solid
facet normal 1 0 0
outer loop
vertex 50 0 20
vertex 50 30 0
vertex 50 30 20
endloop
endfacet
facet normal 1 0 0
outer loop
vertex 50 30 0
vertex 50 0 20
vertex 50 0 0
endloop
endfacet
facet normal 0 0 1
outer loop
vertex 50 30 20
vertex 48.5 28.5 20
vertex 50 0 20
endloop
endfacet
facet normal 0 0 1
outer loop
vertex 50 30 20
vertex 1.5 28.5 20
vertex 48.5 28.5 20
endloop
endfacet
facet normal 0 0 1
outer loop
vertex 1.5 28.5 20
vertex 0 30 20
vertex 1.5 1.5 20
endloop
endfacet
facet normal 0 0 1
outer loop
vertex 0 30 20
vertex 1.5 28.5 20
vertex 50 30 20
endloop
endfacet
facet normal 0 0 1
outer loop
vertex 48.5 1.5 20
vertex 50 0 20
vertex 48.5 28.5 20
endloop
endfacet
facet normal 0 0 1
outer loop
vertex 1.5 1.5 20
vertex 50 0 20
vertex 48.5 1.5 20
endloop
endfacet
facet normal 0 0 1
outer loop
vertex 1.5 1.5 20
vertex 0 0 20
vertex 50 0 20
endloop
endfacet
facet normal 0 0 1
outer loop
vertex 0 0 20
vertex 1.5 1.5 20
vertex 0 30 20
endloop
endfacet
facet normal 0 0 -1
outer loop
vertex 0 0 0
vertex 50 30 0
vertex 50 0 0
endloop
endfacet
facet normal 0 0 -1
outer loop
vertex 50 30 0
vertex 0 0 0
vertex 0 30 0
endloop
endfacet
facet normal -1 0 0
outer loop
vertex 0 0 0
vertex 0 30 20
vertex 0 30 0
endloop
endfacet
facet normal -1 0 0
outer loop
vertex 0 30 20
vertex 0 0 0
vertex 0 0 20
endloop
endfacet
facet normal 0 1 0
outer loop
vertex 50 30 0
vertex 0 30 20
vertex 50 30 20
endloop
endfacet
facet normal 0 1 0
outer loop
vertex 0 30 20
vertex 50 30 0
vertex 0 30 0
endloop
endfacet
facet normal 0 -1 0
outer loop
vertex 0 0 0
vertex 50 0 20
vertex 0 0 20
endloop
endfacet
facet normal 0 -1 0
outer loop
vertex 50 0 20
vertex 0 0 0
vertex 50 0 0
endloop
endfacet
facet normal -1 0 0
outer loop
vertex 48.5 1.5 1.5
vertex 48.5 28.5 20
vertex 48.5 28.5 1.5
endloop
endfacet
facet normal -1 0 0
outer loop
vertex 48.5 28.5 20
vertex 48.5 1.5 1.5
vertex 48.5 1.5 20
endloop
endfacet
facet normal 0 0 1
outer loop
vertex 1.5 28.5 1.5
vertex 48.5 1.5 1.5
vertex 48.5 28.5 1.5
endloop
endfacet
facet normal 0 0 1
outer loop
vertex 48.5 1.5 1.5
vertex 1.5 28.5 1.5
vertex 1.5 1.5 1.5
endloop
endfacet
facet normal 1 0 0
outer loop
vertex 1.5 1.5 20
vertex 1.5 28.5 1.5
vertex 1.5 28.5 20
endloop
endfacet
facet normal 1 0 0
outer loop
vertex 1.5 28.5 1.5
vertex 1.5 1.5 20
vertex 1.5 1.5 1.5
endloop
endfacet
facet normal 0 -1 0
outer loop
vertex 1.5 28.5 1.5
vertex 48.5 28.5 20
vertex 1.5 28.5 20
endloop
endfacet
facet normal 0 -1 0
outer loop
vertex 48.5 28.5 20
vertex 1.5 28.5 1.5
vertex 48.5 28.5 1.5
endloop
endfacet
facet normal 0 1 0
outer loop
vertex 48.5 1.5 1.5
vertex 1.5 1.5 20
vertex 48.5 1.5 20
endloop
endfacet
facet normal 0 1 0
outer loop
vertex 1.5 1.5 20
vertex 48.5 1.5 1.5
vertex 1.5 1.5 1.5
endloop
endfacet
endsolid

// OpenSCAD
$fn = 32;

// ----------------------------------------------------------------------
// Open box: 1.5 mm walls
// ----------------------------------------------------------------------

// --- parameters (mm) ---
box_l = 50;               // outer length, X
box_w = 30;               // outer width, Y
box_h = 20;               // outer height, Z
wall = 1.5;               // wall thickness
floor = 1.5;              // floor thickness

difference() {
  cube([box_l, box_w, box_h]);
  translate([wall, wall, floor])
    cube([box_l - 2 * wall, box_w - 2 * wall, box_h]);
}
